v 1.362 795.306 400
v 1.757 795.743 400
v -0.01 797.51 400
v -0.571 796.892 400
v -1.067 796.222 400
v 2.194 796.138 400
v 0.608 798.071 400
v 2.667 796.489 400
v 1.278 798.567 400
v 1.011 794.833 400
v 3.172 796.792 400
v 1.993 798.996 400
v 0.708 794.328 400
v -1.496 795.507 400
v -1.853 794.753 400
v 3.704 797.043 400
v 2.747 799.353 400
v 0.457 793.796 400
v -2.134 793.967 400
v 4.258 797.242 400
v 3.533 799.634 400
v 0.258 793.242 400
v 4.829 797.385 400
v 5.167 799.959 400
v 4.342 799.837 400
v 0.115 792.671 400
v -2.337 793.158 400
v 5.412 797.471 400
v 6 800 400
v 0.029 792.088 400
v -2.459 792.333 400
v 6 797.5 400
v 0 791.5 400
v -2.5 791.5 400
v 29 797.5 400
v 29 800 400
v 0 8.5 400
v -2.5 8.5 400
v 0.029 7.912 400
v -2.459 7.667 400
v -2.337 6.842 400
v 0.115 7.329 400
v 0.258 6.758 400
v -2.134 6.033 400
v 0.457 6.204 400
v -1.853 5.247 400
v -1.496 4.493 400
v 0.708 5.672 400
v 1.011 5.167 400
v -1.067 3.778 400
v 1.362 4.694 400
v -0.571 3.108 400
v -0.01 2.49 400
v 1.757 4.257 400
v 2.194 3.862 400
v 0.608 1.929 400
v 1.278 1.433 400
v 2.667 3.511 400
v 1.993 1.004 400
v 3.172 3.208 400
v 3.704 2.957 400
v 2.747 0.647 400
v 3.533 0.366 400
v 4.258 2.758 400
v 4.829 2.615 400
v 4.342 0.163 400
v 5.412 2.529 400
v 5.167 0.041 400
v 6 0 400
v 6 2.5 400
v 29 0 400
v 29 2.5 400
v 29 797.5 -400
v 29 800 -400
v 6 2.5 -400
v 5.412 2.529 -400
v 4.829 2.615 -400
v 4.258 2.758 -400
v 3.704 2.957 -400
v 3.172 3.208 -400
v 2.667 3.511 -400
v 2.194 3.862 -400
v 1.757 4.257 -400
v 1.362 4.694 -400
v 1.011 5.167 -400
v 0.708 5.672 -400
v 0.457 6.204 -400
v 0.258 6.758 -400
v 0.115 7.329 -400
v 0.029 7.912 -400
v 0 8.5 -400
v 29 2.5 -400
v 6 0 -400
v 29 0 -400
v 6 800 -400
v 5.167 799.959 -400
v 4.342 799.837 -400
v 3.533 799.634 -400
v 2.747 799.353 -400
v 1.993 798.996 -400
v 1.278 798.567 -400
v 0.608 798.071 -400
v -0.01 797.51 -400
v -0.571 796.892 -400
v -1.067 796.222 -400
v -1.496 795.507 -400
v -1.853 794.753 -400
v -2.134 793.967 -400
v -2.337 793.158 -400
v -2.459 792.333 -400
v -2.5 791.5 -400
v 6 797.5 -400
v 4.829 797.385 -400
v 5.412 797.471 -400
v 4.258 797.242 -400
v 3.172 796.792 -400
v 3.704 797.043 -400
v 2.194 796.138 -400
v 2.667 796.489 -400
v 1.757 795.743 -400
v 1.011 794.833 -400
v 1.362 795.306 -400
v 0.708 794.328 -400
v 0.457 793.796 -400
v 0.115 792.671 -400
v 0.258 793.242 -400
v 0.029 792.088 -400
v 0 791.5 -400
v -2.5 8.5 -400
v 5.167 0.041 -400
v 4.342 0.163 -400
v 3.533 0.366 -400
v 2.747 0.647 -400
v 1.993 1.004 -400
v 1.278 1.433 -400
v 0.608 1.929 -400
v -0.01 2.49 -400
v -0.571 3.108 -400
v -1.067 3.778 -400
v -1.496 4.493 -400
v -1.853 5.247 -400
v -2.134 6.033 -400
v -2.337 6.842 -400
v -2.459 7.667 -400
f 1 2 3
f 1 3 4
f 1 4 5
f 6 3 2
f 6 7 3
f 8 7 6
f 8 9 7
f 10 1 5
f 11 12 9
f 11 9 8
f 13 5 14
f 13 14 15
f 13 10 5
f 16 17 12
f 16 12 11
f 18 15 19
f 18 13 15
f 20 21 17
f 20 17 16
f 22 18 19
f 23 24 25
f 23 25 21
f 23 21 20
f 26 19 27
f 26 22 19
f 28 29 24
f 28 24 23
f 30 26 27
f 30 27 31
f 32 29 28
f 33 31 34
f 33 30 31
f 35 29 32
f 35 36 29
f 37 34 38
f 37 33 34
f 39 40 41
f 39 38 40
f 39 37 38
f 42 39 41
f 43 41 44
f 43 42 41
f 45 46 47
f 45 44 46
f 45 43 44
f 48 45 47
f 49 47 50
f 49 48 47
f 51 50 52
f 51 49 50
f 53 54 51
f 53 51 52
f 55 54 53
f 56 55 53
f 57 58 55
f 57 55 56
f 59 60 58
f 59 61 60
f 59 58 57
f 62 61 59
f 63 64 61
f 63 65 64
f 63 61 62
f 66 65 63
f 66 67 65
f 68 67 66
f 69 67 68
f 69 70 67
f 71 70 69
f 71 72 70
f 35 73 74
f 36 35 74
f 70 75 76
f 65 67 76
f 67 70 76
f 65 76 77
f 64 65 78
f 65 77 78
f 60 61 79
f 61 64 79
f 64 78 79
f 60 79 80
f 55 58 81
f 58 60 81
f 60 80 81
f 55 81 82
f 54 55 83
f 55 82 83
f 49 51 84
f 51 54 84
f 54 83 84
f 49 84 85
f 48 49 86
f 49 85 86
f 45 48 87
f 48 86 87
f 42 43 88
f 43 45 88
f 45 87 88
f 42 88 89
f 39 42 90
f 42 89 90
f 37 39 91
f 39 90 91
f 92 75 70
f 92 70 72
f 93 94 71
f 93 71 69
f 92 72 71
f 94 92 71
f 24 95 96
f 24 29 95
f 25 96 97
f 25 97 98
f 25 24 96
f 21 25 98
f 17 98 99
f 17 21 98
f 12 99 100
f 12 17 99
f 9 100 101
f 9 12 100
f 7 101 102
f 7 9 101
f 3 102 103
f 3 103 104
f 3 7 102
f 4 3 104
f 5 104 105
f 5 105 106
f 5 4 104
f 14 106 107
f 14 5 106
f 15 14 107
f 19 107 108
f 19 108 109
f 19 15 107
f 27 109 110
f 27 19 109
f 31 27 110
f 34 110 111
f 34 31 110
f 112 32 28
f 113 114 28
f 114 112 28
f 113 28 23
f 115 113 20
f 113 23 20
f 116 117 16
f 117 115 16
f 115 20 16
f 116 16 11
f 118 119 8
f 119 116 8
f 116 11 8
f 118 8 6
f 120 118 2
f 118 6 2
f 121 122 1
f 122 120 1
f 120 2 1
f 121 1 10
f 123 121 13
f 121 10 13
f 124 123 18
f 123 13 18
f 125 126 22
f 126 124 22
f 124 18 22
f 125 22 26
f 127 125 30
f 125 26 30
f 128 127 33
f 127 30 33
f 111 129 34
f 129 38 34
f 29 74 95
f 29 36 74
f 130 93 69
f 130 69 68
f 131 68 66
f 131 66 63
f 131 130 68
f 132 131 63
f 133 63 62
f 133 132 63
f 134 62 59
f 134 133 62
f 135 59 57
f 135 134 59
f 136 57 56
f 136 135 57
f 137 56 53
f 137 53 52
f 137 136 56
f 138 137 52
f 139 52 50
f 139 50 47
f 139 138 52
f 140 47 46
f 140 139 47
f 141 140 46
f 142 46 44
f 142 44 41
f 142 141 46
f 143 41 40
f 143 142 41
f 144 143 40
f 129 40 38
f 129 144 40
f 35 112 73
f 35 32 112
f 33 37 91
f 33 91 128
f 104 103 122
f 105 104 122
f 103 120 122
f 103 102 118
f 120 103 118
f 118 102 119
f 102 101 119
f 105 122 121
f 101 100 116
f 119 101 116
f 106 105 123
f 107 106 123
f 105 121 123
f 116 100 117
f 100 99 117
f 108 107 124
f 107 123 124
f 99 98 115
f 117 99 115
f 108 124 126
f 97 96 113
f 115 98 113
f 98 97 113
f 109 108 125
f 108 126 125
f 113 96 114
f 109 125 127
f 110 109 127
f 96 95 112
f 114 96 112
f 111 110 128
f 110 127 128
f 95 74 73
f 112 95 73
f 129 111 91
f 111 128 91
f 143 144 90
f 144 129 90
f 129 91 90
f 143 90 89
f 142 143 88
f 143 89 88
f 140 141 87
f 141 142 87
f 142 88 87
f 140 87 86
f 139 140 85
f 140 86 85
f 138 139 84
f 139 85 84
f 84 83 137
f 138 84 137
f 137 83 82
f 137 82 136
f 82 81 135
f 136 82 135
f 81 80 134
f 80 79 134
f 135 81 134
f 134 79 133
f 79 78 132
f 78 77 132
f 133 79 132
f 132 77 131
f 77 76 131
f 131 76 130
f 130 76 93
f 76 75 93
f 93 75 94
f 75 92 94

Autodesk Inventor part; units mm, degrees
ref_plane "YZ Plane" through (0, 0, 0) normal (1, 0, 0) x (0, 1, 0)
ref_plane "XZ Plane" through (0, 0, 0) normal (0, 1, 0) x (-1, 0, 0)
ref_plane "XY Plane" through (0, 0, 0) normal (0, 0, 1) x (1, 0, 0)
sketch "Náčrt2" plane through (0, 0, 0) normal (1, 0, 0) x (0, 1, 0)
  line L0 (800, 400) -> (0, 400)
  line L1 (0, 400) -> (0, -400)
  line L2 (0, -400) -> (800, -400)
  line L3 (800, -400) -> (800, 400)
  point P0 (0, 0)
  point P1 (0, 0)
  dimension "d0" = 800
  dimension "d1" = 800
extrude "Vysunutí1" add sketch "Náčrt2" against normal blind 2.5
sketch "Náčrt3" plane through (-2.5, 797.5, 400) normal (0, 1, 0) x (-1, 0, 0)
  line L0 (0, -800) -> (0, 0)
  line L1 (0, 0) -> (-31.5, 0)
  line L2 (-31.5, 0) -> (-31.5, -800)
  line L3 (-31.5, -800) -> (0, -800)
edge flange "Obruba1" height 31.5 angle 90 thickness 2.5 bend radius 6 thickness toward (0, 1, 0) relief tear relief width 2.5 relief depth 1.25 corner gap 2.5 corner form 0 edges at (0, 800, 0) (0, 0, 0) wall of the first edge with corners at (-2.5, 797.5, -400) (-2.5, 797.5, 400) (29, 797.5, 400) (29, 797.5, -400)
bend "Ohyb1"
corner "Roh1"
equation "\"d4\" = ŠířkaVýštipu"
equation "\"d5\" = HloubkaVýštipu"
equation "\"d6\" = MinimálníZbytek"
equation "\"d7\" = PoloměrOhybu"
equation "\"d11\" = VelikostRohovéhoVýštipu"
equation "\"d12\" = VelikostMezery"
equation "\"d13\" = VelikostJacobihoPoloměru"
equation "\"PoloměrOhybu\" = Tloušťka"
equation "\"ŠířkaVýštipu\" = Tloušťka"
equation "\"HloubkaVýštipu\" = 0.5 * Tloušťka"
equation "\"MinimálníZbytek\" = 2 * Tloušťka"
equation "\"PřechodovýPoloměr\" = PoloměrOhybu"
equation "\"VelikostJacobihoPoloměru\" = PoloměrOhybu"
equation "\"VelikostMezery\" = Tloušťka"
equation "\"VelikostRohovéhoVýštipu\" = 10"
equation "\"Tloušťka\" = 2.5"
properties part number "DD_KVD_002_02" material "Nerezová ocel"
